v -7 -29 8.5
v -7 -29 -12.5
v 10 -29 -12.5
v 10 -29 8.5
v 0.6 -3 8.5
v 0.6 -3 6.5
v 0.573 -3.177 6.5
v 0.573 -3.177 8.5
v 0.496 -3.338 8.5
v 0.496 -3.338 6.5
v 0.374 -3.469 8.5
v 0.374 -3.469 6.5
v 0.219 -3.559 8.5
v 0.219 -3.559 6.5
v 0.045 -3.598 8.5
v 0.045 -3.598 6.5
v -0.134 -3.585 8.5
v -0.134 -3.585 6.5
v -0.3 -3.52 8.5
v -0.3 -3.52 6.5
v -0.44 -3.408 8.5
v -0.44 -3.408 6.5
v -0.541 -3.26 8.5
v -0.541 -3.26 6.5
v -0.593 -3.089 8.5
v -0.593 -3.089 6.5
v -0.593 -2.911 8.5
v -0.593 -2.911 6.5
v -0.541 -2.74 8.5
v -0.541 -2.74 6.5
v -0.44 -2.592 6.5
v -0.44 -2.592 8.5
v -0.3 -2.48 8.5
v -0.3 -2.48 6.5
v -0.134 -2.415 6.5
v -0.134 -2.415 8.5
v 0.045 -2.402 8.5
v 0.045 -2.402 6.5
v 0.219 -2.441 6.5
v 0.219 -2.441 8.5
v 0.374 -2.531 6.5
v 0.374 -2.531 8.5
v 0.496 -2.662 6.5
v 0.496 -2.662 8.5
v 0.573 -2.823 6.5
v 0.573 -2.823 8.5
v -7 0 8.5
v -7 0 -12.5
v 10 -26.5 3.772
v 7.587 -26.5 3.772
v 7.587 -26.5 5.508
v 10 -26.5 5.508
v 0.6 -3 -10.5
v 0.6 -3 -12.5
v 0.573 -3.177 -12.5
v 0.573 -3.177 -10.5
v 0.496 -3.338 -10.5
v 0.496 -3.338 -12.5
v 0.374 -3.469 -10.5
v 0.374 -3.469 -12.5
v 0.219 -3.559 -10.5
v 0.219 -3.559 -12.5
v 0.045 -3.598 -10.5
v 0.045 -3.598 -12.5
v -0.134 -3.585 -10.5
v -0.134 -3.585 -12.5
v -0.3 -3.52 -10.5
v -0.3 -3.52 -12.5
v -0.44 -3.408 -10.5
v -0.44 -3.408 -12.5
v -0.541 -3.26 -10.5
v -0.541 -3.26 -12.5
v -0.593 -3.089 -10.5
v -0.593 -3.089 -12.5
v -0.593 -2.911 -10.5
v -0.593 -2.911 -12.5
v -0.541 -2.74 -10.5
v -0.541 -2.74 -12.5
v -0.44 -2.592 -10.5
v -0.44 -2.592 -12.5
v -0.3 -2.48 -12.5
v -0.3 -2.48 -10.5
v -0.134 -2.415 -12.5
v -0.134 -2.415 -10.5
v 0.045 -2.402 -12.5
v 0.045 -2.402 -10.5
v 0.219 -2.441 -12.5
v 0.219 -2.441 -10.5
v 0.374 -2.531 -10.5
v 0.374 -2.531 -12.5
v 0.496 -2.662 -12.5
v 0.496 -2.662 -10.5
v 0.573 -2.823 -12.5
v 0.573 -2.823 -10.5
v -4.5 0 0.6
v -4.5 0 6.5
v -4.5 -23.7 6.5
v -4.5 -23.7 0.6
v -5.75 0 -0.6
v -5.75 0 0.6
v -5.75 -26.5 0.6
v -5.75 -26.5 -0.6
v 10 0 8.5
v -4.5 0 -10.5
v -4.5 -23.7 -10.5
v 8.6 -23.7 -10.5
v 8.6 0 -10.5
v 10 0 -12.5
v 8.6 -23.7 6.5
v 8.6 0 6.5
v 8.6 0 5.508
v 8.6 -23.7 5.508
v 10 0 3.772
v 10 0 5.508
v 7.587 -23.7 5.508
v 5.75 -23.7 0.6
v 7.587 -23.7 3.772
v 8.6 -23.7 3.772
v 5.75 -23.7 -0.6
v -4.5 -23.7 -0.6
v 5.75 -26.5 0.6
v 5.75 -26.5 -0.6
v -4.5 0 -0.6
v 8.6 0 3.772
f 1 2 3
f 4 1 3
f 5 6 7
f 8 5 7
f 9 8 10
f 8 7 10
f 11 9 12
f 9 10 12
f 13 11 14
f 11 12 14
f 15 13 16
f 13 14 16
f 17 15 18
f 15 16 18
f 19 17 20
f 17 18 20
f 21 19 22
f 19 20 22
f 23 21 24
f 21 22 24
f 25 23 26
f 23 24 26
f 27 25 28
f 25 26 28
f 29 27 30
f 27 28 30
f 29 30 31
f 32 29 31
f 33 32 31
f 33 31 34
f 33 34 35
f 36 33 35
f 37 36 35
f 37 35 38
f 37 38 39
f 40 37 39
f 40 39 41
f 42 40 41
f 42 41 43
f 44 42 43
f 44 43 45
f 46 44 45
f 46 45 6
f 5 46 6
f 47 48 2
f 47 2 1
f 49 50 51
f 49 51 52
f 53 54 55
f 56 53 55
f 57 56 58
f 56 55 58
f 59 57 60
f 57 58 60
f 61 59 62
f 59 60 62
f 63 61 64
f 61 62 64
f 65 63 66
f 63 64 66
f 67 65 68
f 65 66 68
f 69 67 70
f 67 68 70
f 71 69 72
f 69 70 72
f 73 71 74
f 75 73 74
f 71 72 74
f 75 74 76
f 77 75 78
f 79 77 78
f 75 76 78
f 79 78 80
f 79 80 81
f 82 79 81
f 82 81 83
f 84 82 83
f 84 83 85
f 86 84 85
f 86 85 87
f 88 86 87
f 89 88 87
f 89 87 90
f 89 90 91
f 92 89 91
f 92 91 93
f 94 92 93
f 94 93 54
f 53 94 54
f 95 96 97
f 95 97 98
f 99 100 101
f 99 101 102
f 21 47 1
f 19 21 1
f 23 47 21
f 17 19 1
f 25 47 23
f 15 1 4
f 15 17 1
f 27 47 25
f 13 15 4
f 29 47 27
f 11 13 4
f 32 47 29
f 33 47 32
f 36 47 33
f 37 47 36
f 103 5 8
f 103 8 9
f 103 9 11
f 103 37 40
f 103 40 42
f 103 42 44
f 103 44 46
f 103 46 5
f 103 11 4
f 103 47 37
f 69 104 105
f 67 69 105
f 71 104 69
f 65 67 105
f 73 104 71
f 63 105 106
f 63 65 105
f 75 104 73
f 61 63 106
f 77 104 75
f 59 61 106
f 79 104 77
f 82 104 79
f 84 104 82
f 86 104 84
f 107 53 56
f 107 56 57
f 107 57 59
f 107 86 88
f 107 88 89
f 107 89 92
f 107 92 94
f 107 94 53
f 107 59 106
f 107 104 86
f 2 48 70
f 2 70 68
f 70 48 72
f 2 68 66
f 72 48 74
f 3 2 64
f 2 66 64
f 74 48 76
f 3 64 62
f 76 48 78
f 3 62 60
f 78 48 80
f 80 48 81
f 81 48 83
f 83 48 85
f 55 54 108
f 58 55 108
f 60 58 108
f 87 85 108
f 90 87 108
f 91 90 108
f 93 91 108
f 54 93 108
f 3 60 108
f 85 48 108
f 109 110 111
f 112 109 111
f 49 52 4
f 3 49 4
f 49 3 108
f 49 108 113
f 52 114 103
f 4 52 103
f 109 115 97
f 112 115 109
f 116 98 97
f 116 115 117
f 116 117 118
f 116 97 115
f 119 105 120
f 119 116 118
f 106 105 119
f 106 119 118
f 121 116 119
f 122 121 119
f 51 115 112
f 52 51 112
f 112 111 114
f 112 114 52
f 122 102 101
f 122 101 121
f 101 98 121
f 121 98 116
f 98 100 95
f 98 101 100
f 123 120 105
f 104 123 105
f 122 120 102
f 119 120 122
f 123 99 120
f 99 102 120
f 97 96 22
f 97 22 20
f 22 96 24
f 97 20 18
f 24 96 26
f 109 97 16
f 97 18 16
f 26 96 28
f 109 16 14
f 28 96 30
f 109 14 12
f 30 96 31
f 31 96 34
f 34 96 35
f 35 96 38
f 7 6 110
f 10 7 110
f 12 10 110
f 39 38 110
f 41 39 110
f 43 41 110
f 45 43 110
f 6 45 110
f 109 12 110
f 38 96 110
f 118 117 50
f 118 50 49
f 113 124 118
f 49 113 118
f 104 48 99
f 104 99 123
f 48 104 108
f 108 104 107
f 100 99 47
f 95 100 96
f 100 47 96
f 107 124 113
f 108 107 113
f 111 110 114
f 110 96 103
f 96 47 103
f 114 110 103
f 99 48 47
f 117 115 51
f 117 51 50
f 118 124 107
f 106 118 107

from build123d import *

# Parameters (mm, degrees)
SKETCH012_W     = 17
SKETCH012_H     = 21
PAD009_DEPTH    = 29
SKETCH013_W     = 13.1
SKETCH013_H     = 17
POCKET001_DEPTH = 23.7
SKETCH014_W     = 11.5
SKETCH014_H     = 1.2
SKETCH014_W_2   = 3.205285
SKETCH014_H_2   = 1.736194
POCKET002_DEPTH = 26.5
SKETCH016_R     = 0.6
POCKET003_DEPTH = 27


with BuildPart() as part:
    # Sketch012 → Pad009 (new body)
    with BuildSketch(Plane.XZ):
        with Locations((1.5, -2)):
            Rectangle(SKETCH012_W, SKETCH012_H)
    extrude(amount=PAD009_DEPTH)

    # Sketch013 (on Face5 of Pad009) → Pocket001 (cut)
    with BuildSketch(Plane(origin=(0, 0, 0), x_dir=(1, 0, 0), z_dir=(0, 1, 0))):
        with Locations((2.05, 2)):
            Rectangle(SKETCH013_W, SKETCH013_H)
    extrude(amount=-POCKET001_DEPTH, mode=Mode.SUBTRACT)

    # Sketch014 (on Face4 of Pocket001) → Pocket002 (cut)
    with BuildSketch(Plane(origin=(0, 0, 0), x_dir=(1, 0, 0), z_dir=(0, 1, 0))):
        Rectangle(SKETCH014_W, SKETCH014_H)
        with Locations((9.189982, -4.640042)):
            Rectangle(SKETCH014_W_2, SKETCH014_H_2)
    extrude(amount=-POCKET002_DEPTH, mode=Mode.SUBTRACT)

    # Sketch016 (on Face6 of Pocket002) → Pocket003 (cut)
    with BuildSketch(Plane(origin=(0, 0, -12.5), x_dir=(1, 0, 0), z_dir=(0, 0, -1))):
        with Locations((0, 3)):
            Circle(SKETCH016_R)
    extrude(amount=-POCKET003_DEPTH, mode=Mode.SUBTRACT)


solid = part.part
